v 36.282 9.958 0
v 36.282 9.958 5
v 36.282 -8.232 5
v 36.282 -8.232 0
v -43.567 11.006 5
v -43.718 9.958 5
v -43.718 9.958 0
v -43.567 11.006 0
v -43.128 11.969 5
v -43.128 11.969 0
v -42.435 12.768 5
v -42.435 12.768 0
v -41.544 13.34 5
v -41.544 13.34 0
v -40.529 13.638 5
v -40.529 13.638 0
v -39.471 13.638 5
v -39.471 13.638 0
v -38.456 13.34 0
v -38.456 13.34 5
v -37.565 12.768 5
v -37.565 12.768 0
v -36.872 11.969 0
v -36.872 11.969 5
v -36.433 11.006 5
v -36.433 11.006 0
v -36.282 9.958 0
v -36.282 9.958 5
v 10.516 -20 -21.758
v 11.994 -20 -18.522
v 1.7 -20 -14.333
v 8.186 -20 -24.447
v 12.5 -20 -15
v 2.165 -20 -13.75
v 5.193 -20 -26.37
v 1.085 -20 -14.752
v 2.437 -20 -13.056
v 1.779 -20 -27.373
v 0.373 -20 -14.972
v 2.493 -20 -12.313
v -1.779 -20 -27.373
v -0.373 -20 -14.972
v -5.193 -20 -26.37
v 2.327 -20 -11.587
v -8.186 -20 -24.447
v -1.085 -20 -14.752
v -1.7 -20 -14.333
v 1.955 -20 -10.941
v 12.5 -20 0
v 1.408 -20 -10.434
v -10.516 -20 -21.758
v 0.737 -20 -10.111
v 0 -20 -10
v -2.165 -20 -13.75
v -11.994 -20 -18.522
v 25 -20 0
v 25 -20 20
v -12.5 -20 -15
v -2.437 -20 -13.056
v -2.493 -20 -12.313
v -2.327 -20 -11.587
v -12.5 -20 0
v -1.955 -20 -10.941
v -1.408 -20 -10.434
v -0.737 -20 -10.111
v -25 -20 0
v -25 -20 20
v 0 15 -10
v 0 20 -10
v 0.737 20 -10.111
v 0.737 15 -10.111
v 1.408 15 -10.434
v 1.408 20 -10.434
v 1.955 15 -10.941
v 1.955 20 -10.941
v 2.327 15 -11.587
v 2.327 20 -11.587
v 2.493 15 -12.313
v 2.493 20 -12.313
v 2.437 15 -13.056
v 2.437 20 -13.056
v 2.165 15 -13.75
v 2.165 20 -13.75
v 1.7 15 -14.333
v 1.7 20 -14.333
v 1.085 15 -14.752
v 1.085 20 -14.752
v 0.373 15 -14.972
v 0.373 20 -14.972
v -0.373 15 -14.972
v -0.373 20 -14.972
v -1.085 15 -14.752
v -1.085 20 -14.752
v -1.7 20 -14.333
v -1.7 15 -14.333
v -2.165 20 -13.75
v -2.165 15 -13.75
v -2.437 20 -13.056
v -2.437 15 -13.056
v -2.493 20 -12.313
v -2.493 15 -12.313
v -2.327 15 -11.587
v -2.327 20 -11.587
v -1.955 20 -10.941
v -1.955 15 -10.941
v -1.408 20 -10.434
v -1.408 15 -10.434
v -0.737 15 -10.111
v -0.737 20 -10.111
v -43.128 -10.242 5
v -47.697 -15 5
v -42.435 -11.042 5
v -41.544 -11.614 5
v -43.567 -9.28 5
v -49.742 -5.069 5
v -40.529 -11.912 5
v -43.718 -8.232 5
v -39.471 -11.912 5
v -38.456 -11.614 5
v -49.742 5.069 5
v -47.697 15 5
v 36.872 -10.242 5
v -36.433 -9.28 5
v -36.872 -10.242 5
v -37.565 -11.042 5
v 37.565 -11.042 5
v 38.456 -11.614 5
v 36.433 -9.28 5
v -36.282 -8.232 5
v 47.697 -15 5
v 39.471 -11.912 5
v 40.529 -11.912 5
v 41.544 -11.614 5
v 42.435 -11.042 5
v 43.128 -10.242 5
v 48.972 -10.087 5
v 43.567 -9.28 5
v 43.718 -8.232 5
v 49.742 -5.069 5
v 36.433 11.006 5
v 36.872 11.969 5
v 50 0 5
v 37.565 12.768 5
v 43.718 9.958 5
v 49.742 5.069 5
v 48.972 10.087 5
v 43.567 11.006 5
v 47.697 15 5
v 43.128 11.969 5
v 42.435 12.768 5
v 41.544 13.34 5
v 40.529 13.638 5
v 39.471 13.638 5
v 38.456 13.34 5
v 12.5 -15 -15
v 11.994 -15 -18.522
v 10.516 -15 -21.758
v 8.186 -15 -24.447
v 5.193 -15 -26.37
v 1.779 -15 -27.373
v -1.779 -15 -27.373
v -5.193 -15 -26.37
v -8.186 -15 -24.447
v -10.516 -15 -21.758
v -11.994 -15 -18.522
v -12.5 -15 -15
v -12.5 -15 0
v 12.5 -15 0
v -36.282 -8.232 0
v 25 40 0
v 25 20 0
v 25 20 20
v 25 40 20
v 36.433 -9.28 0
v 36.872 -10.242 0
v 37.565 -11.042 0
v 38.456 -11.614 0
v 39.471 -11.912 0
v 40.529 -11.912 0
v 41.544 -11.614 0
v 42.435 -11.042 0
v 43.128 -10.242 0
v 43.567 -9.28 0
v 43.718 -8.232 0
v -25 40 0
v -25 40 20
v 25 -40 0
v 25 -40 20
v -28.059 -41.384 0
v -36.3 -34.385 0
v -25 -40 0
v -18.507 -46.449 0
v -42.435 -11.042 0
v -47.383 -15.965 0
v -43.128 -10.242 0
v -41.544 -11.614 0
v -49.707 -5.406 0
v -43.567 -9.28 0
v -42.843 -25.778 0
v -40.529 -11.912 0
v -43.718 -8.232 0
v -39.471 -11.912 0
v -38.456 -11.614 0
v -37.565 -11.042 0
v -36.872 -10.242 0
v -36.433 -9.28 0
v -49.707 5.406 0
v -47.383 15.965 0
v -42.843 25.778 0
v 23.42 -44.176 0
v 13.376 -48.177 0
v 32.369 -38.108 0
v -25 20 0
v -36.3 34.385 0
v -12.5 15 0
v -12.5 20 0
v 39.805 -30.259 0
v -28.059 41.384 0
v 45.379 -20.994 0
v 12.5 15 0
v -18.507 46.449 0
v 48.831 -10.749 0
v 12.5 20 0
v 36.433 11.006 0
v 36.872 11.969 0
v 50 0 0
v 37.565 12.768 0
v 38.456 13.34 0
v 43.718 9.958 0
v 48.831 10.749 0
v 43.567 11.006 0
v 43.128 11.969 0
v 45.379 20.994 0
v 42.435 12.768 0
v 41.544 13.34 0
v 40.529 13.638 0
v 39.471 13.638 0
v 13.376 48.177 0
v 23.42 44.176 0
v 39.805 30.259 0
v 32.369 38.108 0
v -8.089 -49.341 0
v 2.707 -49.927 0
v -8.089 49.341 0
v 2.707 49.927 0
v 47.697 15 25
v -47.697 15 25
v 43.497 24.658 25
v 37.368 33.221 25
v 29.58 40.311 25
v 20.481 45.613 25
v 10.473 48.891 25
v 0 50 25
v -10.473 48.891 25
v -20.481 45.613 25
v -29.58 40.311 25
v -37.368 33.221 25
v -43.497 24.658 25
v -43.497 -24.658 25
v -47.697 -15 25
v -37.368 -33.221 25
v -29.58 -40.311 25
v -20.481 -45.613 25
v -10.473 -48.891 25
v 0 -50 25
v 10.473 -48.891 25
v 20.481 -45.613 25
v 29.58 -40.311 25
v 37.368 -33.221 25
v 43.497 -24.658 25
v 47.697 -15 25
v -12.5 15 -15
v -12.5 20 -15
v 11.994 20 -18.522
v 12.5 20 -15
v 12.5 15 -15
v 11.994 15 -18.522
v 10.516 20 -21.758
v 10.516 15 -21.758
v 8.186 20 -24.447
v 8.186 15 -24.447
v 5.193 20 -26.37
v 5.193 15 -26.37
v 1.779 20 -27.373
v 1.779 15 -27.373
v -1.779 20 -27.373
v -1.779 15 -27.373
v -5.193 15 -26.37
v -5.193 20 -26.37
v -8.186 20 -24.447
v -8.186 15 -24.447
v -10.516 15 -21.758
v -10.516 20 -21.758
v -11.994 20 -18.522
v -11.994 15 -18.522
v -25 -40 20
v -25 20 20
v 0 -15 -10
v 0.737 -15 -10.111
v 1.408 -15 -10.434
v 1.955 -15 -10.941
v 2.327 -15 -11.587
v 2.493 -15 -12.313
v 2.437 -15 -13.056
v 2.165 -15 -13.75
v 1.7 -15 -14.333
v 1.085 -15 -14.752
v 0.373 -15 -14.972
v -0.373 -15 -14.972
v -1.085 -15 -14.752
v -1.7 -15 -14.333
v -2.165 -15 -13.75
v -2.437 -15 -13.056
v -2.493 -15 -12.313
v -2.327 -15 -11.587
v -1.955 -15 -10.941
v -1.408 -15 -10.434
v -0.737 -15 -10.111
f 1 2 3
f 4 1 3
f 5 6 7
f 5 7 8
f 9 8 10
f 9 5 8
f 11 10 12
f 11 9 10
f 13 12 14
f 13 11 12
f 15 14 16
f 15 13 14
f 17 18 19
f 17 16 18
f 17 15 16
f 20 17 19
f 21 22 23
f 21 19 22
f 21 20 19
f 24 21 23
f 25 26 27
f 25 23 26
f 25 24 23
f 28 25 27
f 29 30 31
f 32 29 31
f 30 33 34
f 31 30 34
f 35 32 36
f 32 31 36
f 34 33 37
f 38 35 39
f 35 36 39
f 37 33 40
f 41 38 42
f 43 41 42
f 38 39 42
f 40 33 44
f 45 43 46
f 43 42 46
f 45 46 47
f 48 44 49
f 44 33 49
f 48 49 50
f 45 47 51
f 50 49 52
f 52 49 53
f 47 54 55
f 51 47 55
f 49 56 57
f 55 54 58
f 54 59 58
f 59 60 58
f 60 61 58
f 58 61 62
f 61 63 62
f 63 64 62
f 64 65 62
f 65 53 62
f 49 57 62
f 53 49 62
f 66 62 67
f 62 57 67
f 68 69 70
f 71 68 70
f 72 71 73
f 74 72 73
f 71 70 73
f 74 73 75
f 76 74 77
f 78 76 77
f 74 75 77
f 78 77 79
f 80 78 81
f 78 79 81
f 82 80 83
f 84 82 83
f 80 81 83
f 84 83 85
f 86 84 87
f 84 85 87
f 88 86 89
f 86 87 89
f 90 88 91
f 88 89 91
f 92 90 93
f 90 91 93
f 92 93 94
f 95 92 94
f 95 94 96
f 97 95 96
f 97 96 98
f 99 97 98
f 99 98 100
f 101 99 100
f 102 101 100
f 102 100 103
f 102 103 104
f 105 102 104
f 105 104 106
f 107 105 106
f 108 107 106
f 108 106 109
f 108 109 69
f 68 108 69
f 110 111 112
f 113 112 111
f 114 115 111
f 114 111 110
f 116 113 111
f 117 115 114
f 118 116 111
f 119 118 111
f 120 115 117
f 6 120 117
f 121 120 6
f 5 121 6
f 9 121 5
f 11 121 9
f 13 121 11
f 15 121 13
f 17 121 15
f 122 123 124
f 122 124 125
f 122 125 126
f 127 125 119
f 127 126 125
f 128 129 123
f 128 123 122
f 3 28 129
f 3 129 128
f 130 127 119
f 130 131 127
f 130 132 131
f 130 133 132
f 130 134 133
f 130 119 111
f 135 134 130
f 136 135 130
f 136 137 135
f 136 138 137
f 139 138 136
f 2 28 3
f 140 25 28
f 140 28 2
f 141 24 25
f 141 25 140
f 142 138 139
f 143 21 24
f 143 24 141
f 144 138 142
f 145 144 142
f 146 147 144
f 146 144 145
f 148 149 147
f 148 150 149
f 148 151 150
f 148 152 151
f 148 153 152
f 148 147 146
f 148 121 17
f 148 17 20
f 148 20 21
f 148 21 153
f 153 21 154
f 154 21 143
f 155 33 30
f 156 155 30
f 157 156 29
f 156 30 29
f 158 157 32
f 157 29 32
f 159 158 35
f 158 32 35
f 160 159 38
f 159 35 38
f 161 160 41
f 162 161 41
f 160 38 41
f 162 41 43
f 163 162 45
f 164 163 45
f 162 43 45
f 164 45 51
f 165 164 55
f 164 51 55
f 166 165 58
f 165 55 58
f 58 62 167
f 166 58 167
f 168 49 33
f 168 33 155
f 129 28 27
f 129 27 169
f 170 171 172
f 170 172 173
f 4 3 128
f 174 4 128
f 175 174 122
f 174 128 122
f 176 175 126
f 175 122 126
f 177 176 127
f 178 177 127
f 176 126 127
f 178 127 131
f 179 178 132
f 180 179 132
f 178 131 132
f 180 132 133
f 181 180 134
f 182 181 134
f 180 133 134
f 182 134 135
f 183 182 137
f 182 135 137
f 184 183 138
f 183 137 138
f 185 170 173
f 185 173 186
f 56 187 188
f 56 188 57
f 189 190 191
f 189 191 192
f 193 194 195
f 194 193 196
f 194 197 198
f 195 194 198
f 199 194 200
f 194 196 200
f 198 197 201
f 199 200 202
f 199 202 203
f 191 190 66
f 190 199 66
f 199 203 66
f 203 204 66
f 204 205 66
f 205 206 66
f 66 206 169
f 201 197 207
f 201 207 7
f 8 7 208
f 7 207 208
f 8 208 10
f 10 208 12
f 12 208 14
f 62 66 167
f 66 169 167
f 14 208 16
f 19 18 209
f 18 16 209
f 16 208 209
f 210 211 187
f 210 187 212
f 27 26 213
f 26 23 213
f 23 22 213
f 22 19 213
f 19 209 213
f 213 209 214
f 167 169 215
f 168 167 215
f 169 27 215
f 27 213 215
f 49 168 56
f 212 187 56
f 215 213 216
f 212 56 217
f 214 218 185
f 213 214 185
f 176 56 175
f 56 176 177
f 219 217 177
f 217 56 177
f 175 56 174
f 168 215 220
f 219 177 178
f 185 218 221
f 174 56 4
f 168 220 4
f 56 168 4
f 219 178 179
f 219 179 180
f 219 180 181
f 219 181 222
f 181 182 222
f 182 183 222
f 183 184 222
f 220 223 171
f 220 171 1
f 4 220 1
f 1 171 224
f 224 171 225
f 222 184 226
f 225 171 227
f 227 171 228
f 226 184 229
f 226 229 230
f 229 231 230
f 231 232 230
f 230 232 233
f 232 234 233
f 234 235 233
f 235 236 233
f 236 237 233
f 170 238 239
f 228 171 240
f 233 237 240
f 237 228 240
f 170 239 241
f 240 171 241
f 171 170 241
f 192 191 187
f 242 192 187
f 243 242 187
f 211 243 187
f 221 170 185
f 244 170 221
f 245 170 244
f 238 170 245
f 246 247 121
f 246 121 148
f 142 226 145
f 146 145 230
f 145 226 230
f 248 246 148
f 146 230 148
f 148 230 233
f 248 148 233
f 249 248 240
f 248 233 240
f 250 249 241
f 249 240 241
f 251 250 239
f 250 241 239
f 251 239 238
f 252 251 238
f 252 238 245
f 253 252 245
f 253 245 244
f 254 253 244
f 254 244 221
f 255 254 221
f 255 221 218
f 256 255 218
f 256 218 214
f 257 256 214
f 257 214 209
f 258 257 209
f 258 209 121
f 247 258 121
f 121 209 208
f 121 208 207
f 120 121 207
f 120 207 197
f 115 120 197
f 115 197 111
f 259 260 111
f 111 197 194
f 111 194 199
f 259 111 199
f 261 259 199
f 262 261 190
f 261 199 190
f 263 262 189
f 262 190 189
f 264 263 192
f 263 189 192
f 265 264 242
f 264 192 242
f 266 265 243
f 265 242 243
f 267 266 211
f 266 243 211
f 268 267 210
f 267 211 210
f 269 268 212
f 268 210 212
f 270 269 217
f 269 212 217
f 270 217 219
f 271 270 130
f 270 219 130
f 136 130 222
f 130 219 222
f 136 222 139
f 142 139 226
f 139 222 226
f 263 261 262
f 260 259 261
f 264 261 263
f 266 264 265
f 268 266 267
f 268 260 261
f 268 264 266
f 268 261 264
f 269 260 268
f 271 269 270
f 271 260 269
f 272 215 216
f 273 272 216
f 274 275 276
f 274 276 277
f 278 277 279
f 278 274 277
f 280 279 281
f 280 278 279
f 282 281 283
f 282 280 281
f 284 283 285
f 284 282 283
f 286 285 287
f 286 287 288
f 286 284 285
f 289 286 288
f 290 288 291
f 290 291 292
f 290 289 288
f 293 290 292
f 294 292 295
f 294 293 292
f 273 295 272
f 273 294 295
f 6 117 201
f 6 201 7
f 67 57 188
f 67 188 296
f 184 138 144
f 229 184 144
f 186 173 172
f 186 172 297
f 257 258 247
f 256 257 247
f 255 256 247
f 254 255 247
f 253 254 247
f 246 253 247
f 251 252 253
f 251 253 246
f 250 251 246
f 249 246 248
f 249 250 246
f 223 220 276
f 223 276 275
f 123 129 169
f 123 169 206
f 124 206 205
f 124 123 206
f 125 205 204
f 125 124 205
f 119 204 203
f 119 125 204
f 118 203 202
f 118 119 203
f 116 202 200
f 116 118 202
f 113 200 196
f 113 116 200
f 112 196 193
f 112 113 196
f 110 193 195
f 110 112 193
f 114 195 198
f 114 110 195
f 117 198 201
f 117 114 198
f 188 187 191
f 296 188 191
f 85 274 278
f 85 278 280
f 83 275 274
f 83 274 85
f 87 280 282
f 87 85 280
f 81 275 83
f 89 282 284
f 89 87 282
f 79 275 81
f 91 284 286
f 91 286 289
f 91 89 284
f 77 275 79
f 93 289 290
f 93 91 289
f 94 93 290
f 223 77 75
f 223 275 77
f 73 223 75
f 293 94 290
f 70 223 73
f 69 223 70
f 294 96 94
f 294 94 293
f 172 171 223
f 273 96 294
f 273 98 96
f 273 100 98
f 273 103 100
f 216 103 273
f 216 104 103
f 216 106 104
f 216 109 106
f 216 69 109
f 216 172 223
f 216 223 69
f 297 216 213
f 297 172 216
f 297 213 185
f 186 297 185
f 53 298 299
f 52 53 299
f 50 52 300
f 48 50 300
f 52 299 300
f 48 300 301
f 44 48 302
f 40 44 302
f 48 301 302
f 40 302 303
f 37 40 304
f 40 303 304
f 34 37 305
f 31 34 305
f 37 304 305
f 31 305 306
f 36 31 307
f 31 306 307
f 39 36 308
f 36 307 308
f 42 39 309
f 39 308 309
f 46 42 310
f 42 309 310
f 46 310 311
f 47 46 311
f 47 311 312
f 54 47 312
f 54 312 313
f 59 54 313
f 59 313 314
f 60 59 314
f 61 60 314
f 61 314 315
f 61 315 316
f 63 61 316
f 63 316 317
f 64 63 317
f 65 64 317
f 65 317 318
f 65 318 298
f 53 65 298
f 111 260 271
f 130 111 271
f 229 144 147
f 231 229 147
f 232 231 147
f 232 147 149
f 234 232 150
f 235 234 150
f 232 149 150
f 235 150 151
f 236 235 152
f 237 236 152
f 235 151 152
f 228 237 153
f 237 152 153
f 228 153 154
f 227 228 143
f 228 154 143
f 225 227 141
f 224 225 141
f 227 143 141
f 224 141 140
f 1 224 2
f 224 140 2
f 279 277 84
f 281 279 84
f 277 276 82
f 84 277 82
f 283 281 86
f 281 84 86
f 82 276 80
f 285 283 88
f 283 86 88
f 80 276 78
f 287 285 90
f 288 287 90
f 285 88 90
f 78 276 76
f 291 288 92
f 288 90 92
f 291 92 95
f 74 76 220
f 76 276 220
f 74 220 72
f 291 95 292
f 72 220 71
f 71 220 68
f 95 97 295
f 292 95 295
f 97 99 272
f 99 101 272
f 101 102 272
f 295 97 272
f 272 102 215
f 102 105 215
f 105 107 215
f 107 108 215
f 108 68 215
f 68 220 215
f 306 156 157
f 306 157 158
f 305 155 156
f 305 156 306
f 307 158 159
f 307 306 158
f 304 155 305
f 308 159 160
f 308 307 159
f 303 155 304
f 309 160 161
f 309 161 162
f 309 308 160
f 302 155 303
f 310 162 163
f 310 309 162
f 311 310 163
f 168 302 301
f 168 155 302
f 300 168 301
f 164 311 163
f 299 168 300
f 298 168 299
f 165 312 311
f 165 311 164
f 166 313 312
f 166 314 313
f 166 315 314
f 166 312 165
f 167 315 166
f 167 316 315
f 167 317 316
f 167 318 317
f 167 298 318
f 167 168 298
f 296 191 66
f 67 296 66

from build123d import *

# Parameters (mm, degrees)
SKETCH_1_R          = 50
EXTRUDE_1_DEPTH     = 25
SKETCH_3_W          = 50
SKETCH_3_H          = 20
CUT_EXTRUDE_1_DEPTH = 20
SKETCH_6_W          = 25
SKETCH_6_H          = 5
EXTRUDE_2_DEPTH     = 15
EXTRUDE_3_DEPTH     = 5
SKETCH_7_R          = 2.5
CUT_EXTRUDE_2_DEPTH = 91.311959341
SKETCH_9_W          = 137.55999238
SKETCH_9_H          = 30
CUT_EXTRUDE_3_DEPTH = 20
CUT_EXTRUDE_4_DEPTH = 78.821912081


with BuildPart() as part:
    # 草圖1 → 填料-伸長1 (new body)
    with BuildSketch(Plane.XY):
        Circle(SKETCH_1_R)
    extrude(amount=EXTRUDE_1_DEPTH)

    # 草圖3 → 除料-伸長1 (cut)
    with BuildSketch(Plane(origin=(0, 0, 0), x_dir=(-1, 0, 0), z_dir=(0, 0, -1))):
        with Locations((0, 30)):
            Rectangle(SKETCH_3_W, SKETCH_3_H)
        with Locations((0, -30)):
            Rectangle(SKETCH_3_W, SKETCH_3_H)
    extrude(amount=-CUT_EXTRUDE_1_DEPTH, mode=Mode.SUBTRACT)

    # 草圖6 → 填料-伸長2 (add)
    with BuildSketch(Plane(origin=(0, 0, 0), x_dir=(-1, 0, 0), z_dir=(0, 0, -1))):
        with Locations((0, 17.5)):
            Rectangle(SKETCH_6_W, SKETCH_6_H)
        with Locations((0, -17.5)):
            Rectangle(SKETCH_6_W, SKETCH_6_H)
    extrude(amount=EXTRUDE_2_DEPTH)

    # 草圖8 → 填料-伸長3 (add)
    with BuildSketch(Plane.XZ.offset(20)):
        with BuildLine():
            Line((-12.5, -15), (12.5, -15))
            ThreePointArc((12.5, -15), (0, -27.5), (-12.5, -15))
        make_face()
    extrude_3 = extrude(amount=-EXTRUDE_3_DEPTH)

    # 鏡射1: 填料-伸長3 across plane
    add(extrude_3.mirror(Plane.ZX))

    # 草圖7 → 除料-伸長2 (cut, through all)
    with BuildSketch(Plane(origin=(0, 20, 0), x_dir=(1, 0, 0), z_dir=(0, 1, 0))):
        with Locations(Location((0, 12.5, 0), (0, 0, 270))):
            Circle(SKETCH_7_R)
    extrude(amount=-CUT_EXTRUDE_2_DEPTH, mode=Mode.SUBTRACT)

    # 草圖9 → 除料-伸長3 (cut)
    with BuildSketch(Plane.XY.offset(25)):
        with Locations((-0.331949789, 0)):
            Rectangle(SKETCH_9_W, SKETCH_9_H)
    extrude(amount=-CUT_EXTRUDE_3_DEPTH, mode=Mode.SUBTRACT)

    # 草圖10 → 除料-伸長4 (cut, through all)
    with BuildSketch(Plane.XY.offset(5)):
        with BuildLine():
            Line((-36.282162368, 9.958493657), (-36.282162368, -8.232354756))
            ThreePointArc((-36.282162368, -8.232354756), (-40, -11.950192388), (-43.717837632, -8.232354756))
            Line((-43.717837632, -8.232354756), (-43.717837632, 9.958493657))
            ThreePointArc((-43.717837632, 9.958493657), (-40, 13.676331289), (-36.282162368, 9.958493657))
        make_face()
        with BuildLine():
            Line((36.282162368, 9.958493657), (36.282162368, -8.232354756))
            ThreePointArc((36.282162368, -8.232354756), (40, -11.950192388), (43.717837632, -8.232354756))
            Line((43.717837632, -8.232354756), (43.717837632, 9.958493657))
            ThreePointArc((43.717837632, 9.958493657), (40, 13.676331289), (36.282162368, 9.958493657))
        make_face()
    extrude(amount=-CUT_EXTRUDE_4_DEPTH, mode=Mode.SUBTRACT)


solid = part.part
